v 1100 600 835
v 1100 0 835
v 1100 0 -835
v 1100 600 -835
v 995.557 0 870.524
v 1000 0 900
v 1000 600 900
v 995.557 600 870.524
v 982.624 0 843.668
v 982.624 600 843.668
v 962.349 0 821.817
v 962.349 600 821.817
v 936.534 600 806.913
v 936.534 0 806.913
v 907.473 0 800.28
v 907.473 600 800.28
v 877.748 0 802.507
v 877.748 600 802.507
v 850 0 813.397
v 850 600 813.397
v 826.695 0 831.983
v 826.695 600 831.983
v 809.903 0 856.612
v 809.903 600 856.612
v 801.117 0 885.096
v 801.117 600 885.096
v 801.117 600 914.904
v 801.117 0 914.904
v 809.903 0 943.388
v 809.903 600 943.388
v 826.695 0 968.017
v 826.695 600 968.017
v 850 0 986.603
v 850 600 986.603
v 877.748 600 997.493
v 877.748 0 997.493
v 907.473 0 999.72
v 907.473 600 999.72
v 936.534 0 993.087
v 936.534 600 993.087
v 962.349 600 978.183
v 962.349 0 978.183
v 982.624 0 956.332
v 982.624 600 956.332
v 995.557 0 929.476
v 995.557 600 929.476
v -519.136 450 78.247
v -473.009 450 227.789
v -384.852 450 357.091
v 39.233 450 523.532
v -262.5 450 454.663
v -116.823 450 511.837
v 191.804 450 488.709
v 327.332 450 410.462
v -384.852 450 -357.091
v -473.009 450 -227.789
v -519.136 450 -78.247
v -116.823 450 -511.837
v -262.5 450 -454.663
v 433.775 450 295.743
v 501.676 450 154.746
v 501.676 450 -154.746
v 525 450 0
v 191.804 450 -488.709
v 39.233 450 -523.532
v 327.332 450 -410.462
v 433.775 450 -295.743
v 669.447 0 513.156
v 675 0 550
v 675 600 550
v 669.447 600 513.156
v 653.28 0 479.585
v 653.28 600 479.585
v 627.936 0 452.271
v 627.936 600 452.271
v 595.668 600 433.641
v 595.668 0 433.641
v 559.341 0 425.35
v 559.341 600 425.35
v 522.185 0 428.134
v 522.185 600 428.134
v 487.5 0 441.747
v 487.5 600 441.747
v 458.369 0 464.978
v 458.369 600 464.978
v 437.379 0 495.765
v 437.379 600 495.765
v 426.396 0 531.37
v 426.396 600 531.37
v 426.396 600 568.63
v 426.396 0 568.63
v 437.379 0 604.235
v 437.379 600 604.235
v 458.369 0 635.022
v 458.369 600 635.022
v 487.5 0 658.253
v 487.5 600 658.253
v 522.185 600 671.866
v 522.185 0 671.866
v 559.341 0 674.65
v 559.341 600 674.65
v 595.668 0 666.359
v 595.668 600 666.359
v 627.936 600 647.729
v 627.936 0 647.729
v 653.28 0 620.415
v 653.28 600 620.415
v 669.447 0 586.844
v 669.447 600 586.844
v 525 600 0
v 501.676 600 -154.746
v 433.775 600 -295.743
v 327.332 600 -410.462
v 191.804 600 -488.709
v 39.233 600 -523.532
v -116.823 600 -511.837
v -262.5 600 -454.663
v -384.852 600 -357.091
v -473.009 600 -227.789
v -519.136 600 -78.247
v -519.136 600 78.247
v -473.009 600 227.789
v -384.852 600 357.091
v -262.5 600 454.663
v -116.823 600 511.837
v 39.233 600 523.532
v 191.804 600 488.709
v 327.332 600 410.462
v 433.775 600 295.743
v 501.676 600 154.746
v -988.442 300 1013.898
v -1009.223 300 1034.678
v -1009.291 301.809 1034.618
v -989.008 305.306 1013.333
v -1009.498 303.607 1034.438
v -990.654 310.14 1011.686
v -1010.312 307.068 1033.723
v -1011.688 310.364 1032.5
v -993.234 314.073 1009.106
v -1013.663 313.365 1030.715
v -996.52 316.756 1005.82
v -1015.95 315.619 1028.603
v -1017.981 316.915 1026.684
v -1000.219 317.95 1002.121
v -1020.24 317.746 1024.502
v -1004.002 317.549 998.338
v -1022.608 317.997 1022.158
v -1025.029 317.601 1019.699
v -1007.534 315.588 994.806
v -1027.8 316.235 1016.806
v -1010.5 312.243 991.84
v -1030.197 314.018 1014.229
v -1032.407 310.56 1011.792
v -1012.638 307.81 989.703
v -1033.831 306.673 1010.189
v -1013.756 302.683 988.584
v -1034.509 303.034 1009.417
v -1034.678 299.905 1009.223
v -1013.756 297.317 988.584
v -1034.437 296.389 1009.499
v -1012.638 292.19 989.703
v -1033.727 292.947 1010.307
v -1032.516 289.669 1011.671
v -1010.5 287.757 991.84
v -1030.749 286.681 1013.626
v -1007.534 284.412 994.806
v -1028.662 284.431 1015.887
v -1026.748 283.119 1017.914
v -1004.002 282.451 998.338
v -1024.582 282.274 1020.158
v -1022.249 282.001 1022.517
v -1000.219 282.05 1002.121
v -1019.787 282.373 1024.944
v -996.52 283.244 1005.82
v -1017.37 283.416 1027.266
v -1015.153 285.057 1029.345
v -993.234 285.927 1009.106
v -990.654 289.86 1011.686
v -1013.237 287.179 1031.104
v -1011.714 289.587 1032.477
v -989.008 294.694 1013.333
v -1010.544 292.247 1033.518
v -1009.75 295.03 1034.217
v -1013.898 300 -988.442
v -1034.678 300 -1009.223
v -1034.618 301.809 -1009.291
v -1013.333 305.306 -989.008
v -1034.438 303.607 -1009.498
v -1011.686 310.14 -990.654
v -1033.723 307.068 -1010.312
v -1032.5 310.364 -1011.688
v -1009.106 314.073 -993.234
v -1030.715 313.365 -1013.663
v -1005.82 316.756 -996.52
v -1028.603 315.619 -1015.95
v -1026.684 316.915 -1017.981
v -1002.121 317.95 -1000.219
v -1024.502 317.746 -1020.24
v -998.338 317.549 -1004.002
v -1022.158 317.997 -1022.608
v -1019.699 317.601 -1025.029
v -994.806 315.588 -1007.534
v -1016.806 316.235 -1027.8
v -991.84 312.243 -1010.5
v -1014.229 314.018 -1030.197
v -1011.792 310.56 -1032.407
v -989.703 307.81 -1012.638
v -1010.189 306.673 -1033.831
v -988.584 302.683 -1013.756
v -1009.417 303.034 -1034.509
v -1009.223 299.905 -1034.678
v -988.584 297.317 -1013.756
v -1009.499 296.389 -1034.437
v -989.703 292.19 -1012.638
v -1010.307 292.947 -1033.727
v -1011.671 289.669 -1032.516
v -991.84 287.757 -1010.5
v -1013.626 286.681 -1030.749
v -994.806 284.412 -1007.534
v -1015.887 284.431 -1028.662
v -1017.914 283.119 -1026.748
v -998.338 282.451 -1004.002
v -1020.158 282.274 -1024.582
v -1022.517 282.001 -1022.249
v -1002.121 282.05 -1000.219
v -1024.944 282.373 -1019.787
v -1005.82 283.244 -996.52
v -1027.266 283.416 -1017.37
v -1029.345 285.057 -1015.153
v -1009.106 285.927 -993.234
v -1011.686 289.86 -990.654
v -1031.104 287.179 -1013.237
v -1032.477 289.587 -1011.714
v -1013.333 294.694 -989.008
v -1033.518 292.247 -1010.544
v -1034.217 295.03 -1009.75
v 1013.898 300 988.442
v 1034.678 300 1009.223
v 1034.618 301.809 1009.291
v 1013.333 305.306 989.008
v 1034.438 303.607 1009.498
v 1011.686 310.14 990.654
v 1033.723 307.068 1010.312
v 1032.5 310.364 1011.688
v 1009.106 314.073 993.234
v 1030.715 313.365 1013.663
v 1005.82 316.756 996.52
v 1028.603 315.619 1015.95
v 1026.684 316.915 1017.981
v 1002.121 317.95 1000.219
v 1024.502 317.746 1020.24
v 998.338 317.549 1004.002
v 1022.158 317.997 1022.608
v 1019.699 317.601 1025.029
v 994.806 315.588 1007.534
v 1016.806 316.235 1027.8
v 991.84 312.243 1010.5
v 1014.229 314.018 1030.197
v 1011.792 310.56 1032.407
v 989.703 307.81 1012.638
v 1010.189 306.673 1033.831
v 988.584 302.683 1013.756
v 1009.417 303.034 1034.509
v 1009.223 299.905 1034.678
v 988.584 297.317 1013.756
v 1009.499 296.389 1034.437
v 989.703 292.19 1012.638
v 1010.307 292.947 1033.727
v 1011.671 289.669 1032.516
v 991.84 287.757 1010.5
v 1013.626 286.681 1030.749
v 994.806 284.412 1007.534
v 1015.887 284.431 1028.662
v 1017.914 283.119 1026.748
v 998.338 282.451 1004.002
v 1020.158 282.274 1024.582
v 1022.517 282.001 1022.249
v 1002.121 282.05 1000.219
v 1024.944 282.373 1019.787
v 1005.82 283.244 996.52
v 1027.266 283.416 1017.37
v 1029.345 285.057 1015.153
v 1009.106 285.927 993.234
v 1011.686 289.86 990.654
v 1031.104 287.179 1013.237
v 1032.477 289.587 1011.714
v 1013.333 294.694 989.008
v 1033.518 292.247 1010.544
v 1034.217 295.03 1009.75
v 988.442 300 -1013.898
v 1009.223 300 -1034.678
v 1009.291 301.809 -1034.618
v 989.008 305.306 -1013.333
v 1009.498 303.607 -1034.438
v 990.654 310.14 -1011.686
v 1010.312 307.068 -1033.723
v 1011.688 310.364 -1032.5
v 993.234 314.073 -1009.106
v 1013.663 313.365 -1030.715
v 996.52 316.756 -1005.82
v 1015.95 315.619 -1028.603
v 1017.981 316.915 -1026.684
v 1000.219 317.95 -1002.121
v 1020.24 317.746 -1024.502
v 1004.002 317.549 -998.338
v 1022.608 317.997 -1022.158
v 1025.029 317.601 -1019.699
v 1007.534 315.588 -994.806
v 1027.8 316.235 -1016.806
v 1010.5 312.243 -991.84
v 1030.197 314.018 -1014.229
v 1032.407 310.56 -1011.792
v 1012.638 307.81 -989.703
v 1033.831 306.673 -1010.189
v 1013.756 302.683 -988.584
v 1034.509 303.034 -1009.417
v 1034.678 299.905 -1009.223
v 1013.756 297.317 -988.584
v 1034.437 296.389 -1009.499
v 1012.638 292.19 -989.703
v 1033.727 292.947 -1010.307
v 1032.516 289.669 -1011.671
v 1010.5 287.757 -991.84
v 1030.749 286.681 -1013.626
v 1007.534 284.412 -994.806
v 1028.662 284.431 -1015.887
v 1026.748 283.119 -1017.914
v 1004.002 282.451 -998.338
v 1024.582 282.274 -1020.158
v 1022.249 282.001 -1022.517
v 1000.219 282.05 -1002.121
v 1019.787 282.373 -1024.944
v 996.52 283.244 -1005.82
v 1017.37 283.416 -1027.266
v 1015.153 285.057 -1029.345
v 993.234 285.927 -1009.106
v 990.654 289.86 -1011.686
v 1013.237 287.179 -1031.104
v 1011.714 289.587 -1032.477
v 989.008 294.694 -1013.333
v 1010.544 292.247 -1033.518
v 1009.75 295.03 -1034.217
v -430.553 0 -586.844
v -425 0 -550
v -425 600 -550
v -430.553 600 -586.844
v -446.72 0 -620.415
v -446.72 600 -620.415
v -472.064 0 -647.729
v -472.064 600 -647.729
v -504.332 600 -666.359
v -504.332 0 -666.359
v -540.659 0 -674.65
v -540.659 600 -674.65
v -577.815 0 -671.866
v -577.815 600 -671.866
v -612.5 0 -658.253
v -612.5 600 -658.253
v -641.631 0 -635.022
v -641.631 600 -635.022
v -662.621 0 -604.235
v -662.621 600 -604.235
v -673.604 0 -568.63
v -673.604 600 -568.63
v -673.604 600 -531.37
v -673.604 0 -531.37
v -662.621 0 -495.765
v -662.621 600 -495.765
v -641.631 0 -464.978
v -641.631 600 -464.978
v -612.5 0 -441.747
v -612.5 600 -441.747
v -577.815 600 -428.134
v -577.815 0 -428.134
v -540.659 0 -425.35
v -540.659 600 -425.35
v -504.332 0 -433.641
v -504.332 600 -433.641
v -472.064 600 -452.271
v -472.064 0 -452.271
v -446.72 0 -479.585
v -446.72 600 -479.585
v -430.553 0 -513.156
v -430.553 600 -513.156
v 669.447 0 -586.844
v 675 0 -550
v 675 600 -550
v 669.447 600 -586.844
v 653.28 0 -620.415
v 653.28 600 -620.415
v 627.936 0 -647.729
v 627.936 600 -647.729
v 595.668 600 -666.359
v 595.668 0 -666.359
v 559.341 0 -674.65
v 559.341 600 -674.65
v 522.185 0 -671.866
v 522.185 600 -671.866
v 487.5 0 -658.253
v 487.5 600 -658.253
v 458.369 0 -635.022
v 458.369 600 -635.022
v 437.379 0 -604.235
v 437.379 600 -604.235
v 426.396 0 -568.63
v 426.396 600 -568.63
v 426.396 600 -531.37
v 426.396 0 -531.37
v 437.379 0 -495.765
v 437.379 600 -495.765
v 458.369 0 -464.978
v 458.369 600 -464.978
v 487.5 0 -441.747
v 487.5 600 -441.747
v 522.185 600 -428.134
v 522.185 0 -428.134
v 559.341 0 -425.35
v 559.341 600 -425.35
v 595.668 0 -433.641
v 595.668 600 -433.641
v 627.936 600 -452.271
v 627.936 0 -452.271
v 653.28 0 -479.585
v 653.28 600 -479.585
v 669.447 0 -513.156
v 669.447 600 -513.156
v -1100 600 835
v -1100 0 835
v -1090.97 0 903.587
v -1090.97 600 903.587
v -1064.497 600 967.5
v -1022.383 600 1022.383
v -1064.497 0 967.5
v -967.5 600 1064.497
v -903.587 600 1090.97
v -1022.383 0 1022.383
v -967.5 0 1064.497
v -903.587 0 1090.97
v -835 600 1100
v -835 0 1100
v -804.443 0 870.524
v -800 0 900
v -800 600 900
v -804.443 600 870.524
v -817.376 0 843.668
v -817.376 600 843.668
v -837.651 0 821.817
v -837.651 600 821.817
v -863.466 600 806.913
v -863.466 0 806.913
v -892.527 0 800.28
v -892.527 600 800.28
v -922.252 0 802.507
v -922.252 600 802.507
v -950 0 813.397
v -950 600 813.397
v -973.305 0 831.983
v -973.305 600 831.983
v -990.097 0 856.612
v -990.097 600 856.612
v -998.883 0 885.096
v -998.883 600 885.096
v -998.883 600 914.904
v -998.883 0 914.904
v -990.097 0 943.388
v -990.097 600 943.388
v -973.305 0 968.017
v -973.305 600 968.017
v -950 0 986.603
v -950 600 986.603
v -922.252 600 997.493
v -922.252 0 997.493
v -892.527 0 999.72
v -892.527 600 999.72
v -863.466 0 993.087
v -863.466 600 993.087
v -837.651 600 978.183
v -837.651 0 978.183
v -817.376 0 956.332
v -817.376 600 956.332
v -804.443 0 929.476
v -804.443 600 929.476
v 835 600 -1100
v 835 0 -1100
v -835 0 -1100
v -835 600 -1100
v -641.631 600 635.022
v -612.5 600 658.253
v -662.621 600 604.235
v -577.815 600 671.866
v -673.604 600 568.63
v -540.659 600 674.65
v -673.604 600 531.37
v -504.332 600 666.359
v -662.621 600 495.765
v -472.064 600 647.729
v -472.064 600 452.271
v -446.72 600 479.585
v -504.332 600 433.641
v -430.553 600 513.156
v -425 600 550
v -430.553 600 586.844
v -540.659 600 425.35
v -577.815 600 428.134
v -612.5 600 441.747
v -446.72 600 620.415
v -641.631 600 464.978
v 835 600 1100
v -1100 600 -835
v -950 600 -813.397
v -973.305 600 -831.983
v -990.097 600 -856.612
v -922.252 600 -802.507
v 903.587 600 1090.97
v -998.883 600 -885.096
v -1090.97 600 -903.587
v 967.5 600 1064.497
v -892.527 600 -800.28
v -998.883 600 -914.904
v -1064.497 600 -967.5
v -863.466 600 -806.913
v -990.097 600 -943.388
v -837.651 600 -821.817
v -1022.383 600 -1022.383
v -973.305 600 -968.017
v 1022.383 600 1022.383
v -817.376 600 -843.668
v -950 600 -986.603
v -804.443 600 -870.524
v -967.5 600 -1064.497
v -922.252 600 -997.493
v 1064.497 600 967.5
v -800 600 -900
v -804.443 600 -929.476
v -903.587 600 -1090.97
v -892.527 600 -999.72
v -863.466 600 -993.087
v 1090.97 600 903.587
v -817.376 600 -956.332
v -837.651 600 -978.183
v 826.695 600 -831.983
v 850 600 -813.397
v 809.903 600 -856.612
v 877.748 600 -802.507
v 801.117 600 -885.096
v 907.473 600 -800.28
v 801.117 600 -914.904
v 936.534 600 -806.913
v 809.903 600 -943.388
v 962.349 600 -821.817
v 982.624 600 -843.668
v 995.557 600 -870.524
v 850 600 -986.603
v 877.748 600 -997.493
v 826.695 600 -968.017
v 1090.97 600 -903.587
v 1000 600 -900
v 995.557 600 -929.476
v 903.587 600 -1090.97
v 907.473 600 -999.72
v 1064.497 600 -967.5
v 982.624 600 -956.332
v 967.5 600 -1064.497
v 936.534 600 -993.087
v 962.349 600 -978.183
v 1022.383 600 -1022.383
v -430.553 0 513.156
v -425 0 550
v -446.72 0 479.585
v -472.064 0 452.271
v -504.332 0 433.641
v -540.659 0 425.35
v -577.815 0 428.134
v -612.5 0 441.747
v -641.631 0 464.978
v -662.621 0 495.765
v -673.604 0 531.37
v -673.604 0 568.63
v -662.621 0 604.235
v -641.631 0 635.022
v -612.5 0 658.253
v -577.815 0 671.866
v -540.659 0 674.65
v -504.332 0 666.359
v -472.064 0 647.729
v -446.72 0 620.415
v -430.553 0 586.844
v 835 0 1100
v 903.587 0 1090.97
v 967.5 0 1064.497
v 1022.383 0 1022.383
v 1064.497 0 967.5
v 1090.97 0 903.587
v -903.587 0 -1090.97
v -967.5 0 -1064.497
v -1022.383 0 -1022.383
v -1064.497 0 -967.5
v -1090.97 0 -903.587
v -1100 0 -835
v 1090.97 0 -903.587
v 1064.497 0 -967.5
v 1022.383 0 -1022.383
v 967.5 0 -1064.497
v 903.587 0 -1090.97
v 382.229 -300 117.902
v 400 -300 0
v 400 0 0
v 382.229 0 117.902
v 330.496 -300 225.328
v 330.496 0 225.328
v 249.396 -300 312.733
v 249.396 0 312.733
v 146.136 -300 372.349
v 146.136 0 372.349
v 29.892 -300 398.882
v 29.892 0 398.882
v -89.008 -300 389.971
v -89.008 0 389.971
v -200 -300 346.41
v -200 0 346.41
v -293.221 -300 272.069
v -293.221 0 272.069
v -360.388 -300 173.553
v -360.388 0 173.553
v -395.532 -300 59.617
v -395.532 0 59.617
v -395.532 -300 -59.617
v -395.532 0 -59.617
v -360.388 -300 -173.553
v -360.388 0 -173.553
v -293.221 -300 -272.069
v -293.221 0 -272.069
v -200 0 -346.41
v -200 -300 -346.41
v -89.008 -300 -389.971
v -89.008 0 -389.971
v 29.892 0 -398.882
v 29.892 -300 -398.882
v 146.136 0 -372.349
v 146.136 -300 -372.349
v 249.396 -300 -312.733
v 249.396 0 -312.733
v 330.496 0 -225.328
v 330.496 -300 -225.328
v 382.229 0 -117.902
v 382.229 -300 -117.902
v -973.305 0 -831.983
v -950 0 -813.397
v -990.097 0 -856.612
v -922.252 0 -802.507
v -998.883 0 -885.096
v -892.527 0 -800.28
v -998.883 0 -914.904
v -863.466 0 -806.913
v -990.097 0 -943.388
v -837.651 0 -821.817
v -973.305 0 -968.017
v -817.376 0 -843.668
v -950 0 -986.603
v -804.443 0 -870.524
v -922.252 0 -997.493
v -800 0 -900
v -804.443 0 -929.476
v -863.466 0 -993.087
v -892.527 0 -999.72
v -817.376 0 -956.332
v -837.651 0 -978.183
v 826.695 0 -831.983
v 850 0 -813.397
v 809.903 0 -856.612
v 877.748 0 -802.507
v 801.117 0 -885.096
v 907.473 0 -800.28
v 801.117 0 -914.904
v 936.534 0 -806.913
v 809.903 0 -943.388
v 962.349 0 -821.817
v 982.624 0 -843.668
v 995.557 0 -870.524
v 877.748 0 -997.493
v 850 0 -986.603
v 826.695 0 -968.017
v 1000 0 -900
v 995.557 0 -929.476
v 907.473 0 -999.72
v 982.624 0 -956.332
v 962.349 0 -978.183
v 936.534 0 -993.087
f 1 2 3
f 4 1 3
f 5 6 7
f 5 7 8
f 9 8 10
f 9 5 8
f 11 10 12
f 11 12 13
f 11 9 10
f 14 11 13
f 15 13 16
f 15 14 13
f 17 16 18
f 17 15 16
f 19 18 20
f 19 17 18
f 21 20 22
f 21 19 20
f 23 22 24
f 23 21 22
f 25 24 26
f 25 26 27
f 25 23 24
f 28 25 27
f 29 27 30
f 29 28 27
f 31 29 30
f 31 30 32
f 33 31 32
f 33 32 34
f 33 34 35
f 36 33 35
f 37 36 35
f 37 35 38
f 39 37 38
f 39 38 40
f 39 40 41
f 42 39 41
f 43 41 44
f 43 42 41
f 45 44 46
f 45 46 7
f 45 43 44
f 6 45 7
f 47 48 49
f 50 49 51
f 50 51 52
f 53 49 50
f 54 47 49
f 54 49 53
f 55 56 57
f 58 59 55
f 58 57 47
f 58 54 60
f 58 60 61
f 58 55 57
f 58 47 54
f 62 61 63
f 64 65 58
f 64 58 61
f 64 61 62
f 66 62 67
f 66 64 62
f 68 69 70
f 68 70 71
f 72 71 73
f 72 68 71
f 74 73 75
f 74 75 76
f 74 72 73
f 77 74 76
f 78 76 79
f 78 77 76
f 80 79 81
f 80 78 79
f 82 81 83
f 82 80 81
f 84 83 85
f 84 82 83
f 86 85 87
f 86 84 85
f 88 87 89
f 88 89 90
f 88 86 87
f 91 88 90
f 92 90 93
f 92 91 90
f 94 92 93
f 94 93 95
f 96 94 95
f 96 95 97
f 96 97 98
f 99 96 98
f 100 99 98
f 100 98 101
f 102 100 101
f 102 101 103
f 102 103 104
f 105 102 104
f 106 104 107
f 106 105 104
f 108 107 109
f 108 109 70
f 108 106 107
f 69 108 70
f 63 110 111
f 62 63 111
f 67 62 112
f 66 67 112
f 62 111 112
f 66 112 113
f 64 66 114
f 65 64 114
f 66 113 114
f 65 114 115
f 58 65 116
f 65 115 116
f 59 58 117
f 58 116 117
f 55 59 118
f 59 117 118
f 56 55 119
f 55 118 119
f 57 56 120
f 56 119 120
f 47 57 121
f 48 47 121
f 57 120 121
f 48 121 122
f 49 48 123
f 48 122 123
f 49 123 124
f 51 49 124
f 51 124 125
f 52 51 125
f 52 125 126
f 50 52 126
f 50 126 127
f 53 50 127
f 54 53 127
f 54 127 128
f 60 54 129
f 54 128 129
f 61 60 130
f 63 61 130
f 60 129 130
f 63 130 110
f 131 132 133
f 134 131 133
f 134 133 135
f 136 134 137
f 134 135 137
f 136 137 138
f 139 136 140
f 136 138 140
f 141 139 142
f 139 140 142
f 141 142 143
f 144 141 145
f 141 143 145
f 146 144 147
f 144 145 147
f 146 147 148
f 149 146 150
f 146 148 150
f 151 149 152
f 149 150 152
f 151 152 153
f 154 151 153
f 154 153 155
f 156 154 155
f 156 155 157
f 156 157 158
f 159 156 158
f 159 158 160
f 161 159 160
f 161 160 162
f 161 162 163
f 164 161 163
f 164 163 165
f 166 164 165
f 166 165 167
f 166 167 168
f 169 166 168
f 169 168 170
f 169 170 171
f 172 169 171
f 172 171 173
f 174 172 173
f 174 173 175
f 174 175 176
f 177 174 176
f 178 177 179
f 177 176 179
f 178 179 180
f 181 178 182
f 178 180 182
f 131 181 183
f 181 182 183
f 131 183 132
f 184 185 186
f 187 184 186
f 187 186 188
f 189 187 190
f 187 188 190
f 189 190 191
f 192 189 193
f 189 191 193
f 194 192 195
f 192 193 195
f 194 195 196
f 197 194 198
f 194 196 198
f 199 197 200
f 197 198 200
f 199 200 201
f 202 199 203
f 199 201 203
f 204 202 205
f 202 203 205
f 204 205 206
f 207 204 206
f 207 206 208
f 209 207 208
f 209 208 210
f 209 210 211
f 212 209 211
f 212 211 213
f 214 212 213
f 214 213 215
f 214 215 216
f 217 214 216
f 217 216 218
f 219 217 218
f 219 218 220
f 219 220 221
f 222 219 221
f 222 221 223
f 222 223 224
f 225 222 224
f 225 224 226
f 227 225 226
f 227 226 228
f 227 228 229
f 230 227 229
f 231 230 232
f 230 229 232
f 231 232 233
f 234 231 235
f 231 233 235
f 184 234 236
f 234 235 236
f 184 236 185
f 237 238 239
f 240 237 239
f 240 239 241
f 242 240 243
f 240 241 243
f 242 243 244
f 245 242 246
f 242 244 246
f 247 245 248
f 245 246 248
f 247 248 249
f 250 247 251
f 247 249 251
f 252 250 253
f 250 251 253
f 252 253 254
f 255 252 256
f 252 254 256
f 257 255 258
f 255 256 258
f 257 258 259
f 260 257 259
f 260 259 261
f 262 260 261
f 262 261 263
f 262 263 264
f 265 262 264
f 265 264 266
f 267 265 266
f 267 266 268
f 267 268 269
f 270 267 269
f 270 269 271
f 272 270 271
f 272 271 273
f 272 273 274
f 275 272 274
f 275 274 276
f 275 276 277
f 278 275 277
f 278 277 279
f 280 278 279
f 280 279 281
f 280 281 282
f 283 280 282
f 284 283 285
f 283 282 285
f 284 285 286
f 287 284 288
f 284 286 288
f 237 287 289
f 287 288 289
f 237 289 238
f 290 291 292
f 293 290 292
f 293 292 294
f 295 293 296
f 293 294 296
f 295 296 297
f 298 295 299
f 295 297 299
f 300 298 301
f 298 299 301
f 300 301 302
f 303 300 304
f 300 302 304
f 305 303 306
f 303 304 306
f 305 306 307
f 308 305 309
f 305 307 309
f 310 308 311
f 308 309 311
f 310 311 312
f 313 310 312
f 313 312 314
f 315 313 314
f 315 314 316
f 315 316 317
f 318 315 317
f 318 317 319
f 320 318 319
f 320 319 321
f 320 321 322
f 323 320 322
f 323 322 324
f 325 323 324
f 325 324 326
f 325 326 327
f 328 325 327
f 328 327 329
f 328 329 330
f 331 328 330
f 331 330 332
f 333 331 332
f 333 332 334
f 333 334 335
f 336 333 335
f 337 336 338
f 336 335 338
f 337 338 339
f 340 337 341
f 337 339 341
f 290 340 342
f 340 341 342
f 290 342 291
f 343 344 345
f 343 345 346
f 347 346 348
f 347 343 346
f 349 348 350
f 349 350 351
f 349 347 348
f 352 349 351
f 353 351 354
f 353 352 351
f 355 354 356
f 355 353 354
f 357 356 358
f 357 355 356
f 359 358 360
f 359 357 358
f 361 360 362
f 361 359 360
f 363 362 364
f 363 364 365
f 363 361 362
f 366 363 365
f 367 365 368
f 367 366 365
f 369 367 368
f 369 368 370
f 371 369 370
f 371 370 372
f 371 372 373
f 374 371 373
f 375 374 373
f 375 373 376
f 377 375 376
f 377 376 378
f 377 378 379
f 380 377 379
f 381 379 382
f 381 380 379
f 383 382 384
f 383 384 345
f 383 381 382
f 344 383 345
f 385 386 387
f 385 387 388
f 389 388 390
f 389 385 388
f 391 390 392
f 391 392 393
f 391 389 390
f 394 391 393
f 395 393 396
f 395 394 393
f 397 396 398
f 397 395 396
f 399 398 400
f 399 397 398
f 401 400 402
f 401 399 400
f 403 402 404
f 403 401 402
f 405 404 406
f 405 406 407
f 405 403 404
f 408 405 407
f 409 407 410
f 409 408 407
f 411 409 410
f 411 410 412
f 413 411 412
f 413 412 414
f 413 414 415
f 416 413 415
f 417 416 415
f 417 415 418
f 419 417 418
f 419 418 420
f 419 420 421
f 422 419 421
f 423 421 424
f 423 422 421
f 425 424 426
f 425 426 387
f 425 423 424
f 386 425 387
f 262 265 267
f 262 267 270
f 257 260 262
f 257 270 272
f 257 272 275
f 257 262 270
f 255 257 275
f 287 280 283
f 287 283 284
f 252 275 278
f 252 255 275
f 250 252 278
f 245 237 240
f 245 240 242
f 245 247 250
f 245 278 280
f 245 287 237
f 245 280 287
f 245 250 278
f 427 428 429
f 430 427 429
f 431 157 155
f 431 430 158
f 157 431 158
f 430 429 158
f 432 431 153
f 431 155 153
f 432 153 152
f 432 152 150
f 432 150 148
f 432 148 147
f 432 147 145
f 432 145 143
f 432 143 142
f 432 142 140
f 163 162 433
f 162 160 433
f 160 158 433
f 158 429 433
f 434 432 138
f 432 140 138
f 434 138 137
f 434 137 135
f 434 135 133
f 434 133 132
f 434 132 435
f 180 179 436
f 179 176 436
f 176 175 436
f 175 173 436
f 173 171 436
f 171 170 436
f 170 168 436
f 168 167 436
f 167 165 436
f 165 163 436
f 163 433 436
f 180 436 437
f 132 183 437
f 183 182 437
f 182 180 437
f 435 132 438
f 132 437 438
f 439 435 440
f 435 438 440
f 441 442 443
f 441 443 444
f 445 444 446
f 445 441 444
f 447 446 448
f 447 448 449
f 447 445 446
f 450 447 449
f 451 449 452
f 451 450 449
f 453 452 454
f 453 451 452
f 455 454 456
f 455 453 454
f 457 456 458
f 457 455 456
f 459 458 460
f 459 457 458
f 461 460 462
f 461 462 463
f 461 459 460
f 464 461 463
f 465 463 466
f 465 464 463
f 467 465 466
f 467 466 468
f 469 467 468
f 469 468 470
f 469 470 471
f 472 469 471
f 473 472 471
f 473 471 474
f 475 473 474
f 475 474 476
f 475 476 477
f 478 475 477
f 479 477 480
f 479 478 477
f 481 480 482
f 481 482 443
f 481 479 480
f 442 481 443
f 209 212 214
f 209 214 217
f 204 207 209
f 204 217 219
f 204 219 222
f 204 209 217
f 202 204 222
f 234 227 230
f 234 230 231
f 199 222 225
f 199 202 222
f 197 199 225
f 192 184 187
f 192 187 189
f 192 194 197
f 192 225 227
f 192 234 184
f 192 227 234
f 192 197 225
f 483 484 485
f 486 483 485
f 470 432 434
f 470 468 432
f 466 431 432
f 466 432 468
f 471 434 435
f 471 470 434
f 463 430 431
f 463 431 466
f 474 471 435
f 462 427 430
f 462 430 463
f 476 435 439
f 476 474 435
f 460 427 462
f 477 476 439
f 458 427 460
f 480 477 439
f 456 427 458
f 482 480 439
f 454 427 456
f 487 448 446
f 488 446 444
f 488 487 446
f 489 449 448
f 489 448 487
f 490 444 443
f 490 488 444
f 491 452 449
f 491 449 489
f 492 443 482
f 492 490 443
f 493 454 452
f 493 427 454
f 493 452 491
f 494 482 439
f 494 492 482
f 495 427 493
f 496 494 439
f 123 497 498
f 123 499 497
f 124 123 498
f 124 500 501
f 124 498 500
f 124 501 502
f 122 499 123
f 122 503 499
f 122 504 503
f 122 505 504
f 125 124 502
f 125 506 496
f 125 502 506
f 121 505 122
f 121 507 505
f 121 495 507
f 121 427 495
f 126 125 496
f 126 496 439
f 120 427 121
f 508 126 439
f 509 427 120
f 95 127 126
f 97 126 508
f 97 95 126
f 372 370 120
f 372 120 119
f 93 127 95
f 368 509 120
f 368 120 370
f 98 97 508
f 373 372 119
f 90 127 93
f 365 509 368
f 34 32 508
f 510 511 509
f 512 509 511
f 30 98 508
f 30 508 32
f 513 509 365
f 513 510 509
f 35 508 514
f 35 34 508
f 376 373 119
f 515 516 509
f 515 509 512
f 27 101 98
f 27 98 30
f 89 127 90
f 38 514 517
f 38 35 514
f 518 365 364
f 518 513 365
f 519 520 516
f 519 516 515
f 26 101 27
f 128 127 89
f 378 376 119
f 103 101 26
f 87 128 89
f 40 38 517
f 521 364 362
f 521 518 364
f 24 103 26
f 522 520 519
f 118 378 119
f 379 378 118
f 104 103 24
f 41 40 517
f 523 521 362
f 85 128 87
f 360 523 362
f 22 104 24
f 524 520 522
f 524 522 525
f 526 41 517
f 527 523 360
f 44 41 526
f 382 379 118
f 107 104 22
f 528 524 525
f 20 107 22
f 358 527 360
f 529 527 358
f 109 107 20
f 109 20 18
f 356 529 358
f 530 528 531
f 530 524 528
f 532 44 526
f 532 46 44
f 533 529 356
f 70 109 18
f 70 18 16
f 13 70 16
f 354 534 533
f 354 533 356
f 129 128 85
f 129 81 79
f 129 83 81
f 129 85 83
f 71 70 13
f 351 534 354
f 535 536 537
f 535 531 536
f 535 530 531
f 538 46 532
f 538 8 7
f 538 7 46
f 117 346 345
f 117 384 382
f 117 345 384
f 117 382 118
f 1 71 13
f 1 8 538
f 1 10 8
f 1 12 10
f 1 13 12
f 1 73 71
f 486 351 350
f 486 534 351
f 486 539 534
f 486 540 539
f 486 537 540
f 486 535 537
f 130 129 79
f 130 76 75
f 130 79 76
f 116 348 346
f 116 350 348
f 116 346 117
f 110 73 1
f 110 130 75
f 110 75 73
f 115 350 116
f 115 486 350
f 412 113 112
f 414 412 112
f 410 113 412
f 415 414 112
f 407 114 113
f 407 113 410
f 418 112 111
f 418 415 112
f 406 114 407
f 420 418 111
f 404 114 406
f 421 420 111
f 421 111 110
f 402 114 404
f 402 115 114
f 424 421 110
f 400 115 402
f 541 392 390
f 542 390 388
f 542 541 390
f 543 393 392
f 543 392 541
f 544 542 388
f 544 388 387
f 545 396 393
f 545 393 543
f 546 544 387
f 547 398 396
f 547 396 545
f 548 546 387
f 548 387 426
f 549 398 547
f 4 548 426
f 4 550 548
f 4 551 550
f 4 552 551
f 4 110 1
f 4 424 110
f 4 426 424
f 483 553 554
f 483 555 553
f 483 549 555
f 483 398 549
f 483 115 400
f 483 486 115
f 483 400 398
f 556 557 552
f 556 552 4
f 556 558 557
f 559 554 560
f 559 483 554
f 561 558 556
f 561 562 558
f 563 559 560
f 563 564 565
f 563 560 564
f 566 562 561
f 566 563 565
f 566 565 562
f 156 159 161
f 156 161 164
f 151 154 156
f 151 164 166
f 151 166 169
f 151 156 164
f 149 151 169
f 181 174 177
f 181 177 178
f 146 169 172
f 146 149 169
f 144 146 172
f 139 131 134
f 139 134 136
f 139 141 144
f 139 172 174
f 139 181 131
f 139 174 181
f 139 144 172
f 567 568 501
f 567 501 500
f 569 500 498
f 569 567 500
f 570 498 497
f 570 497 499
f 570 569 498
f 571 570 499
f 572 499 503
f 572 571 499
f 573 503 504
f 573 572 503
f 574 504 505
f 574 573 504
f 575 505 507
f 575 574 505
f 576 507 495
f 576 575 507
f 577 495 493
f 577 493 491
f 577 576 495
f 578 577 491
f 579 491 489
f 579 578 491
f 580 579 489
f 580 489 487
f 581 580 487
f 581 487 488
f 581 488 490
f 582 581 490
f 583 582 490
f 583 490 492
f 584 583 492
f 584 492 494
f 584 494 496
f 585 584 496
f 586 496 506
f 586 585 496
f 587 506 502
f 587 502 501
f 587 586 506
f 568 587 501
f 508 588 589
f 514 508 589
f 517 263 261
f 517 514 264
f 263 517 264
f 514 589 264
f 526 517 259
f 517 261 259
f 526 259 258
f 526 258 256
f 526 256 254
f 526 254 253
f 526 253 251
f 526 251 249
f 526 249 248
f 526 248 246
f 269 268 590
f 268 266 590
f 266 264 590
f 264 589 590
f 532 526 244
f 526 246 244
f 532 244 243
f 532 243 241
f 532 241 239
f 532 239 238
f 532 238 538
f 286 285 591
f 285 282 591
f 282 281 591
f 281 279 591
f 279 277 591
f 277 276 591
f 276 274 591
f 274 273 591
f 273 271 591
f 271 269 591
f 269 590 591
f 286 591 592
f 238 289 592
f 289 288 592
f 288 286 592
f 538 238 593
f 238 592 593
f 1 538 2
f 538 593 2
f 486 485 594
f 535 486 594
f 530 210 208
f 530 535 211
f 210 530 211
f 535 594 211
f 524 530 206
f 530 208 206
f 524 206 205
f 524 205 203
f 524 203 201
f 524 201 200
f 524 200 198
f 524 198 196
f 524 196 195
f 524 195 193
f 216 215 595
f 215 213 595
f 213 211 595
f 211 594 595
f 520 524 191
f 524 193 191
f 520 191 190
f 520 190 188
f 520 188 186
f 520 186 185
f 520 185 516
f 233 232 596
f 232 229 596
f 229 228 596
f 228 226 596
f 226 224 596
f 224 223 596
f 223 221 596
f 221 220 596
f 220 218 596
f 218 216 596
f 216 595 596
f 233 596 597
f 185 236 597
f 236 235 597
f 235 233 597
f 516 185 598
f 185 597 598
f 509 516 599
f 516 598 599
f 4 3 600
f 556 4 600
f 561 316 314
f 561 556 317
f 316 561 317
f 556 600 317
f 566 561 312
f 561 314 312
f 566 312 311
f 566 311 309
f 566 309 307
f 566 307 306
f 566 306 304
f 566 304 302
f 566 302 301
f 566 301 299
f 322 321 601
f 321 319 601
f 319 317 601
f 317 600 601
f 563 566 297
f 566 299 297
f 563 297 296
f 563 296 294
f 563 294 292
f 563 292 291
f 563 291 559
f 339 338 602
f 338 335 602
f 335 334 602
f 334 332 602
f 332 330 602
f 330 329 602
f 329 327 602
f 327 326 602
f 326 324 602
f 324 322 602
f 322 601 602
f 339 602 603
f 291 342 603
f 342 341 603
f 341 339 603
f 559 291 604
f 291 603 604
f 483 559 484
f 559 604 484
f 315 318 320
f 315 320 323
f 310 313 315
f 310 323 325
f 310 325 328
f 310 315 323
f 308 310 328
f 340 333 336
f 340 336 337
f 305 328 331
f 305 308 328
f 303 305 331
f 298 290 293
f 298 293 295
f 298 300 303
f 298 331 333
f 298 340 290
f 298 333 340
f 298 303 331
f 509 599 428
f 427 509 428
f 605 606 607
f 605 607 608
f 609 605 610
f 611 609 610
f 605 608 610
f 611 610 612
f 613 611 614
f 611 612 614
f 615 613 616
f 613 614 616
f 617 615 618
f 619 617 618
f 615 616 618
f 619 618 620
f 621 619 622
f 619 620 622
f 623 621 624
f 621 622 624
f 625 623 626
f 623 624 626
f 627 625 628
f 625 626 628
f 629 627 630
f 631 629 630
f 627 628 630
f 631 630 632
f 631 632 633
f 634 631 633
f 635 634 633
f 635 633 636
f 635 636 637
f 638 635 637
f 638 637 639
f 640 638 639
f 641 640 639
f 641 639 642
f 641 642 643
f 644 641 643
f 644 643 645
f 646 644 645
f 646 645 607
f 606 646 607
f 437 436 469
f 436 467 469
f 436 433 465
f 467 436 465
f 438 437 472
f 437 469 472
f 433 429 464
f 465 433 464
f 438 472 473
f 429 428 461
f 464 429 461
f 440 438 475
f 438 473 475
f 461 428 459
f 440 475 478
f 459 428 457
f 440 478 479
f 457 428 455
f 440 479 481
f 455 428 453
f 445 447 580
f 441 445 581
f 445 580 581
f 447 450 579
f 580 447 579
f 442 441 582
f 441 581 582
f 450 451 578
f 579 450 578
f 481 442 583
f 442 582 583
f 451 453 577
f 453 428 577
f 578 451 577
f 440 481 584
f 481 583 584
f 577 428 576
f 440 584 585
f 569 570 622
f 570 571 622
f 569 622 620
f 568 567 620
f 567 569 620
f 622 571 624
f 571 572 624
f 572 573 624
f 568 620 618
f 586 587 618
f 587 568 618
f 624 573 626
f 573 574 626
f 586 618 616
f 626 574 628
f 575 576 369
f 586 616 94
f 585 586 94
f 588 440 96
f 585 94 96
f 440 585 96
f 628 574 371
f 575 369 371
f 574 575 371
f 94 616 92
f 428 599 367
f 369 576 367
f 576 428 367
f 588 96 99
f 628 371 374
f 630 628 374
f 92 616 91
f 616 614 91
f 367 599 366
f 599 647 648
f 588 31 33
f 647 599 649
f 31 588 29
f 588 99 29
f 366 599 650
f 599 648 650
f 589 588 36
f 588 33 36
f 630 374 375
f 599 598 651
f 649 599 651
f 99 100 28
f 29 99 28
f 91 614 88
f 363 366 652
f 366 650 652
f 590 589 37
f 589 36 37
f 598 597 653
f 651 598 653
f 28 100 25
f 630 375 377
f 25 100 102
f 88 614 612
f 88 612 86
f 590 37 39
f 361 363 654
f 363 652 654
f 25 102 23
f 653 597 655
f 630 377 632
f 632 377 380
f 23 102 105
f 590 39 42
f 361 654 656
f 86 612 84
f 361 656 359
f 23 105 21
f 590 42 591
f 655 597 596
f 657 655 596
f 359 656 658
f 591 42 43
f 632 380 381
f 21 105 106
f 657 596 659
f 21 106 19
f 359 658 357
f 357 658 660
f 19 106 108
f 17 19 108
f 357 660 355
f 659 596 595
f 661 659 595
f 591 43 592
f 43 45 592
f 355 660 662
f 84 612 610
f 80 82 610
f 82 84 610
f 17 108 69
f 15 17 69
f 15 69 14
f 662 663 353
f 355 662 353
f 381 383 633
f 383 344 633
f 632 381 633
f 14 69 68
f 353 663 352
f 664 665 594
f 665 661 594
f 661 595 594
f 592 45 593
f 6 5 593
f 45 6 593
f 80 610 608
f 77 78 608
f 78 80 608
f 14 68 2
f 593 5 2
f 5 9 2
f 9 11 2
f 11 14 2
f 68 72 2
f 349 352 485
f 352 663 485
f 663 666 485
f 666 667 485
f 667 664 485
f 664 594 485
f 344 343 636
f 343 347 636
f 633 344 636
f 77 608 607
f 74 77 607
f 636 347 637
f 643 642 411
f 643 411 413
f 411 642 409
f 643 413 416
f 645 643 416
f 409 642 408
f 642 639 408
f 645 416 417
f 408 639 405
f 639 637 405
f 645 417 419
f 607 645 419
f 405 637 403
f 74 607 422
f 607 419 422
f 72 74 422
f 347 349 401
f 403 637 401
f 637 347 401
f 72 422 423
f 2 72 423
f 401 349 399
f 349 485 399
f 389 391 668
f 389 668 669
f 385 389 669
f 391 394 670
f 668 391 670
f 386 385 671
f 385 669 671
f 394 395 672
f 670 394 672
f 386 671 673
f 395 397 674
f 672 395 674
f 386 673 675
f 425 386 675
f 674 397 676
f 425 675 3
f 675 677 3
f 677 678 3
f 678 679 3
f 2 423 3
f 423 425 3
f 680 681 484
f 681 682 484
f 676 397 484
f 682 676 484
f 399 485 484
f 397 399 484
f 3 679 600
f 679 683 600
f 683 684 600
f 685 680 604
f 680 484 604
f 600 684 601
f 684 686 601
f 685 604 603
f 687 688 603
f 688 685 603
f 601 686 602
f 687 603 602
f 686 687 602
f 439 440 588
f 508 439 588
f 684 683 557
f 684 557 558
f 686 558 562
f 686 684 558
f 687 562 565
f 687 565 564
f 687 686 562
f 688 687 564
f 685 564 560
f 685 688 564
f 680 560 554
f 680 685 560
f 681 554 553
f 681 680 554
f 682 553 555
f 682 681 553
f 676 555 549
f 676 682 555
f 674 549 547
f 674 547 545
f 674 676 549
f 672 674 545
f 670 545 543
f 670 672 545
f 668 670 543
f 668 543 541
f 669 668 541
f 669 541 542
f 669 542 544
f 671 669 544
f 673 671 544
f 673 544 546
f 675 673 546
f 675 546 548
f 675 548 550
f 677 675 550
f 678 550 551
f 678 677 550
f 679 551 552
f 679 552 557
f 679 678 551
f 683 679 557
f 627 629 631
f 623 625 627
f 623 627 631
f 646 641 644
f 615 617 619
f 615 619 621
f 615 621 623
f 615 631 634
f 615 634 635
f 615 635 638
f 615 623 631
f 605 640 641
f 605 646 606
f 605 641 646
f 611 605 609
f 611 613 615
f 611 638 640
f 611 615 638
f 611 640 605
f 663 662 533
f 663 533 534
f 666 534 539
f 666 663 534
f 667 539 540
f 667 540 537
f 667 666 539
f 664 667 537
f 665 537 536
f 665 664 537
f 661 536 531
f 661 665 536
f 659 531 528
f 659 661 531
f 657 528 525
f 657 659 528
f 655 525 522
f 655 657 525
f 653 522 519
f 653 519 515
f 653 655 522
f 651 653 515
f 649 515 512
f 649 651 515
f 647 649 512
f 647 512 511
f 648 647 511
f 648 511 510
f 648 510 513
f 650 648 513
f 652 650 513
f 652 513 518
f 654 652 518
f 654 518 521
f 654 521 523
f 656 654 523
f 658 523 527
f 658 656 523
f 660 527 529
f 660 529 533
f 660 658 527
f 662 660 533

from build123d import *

# Parameters (mm, degrees)
IZIM1_R                     = 100
IZIM1_R_2                   = 125
Y_KSEKLIK_EKSTR_ZYON3_DEPTH = 600
IZIM2_R                     = 525
KES_EKSTR_ZYON1_DEPTH       = 150
IZIM3_R                     = 400
KES_EKSTR_ZYON2_DEPTH       = 200
IZIM4_R                     = 400
Y_KSEKLIK_EKSTR_ZYON4_DEPTH = 500
IZIM6_R                     = 18
KES_EKSTR_ZYON3_DEPTH       = 30
IZIM8_R                     = 18
KES_EKSTR_ZYON4_DEPTH       = 30
IZIM9_R                     = 18
KES_EKSTR_ZYON5_DEPTH       = 30
IZIM10_R                    = 18
KES_EKSTR_ZYON6_DEPTH       = 30


with BuildPart() as part:
    # Çizim1 → Yükseklik-Ekstrüzyon3 (new body)
    with BuildSketch(Plane(origin=(0, 0, 0), x_dir=(1, 0, 0), z_dir=(0, 1, 0))):
        with BuildLine():
            Line((-835, -1100), (835, -1100))
            ThreePointArc((835, -1100), (1022.383297014, -1022.383297014), (1100, -835))
            Line((1100, -835), (1100, 835))
            ThreePointArc((1100, 835), (1022.383297014, 1022.383297014), (835, 1100))
            Line((835, 1100), (-835, 1100))
            ThreePointArc((-835, 1100), (-1022.383297014, 1022.383297014), (-1100, 835))
            Line((-1100, 835), (-1100, -835))
            ThreePointArc((-1100, -835), (-1022.383297014, -1022.383297014), (-835, -1100))
        make_face()
        with Locations((-900, -900)):
            Circle(IZIM1_R, mode=Mode.SUBTRACT)
        with Locations((-900, 900)):
            Circle(IZIM1_R, mode=Mode.SUBTRACT)
        with Locations((900, 900)):
            Circle(IZIM1_R, mode=Mode.SUBTRACT)
        with Locations((900, -900)):
            Circle(IZIM1_R, mode=Mode.SUBTRACT)
        with Locations((-550, 550)):
            Circle(IZIM1_R_2, mode=Mode.SUBTRACT)
        with Locations((550, 550)):
            Circle(IZIM1_R_2, mode=Mode.SUBTRACT)
        with Locations((550, -550)):
            Circle(IZIM1_R_2, mode=Mode.SUBTRACT)
        with Locations((-550, -550)):
            Circle(IZIM1_R_2, mode=Mode.SUBTRACT)
    extrude(amount=Y_KSEKLIK_EKSTR_ZYON3_DEPTH)

    # Çizim2 → Kes-Ekstrüzyon1 (cut)
    with BuildSketch(Plane(origin=(0, 600, 0), x_dir=(1, 0, 0), z_dir=(0, 1, 0))):
        Circle(IZIM2_R)
    extrude(amount=-KES_EKSTR_ZYON1_DEPTH, mode=Mode.SUBTRACT)

    # Çizim3 → Kes-Ekstrüzyon2 (cut)
    with BuildSketch(Plane.XZ):
        Circle(IZIM3_R)
    extrude(amount=-KES_EKSTR_ZYON2_DEPTH, mode=Mode.SUBTRACT)

    # Çizim4 → Yükseklik-Ekstrüzyon4 (add)
    with BuildSketch(Plane.XZ.offset(-200)):
        Circle(IZIM4_R)
    extrude(amount=Y_KSEKLIK_EKSTR_ZYON4_DEPTH)

    # Çizim6 → Kes-Ekstrüzyon3 (cut)
    with BuildSketch(Plane(origin=(1022.383297014, 600, 1022.383297014), x_dir=(0.707106781, 0, -0.707106781), z_dir=(0.707106781, 0, 0.707106781))):
        with Locations((0, -300)):
            Circle(IZIM6_R)
    extrude(amount=-KES_EKSTR_ZYON3_DEPTH, mode=Mode.SUBTRACT)

    # Çizim8 → Kes-Ekstrüzyon4 (cut)
    with BuildSketch(Plane(origin=(1022.383297014, 600, -1022.383297014), x_dir=(-0.707106781, 0, -0.707106781), z_dir=(0.707106781, 0, -0.707106781))):
        with Locations((0, -300)):
            Circle(IZIM8_R)
    extrude(amount=-KES_EKSTR_ZYON4_DEPTH, mode=Mode.SUBTRACT)

    # Çizim9 → Kes-Ekstrüzyon5 (cut)
    with BuildSketch(Plane(origin=(-1022.383297014, 600, -1022.383297014), x_dir=(-0.707106781, 0, 0.707106781), z_dir=(-0.707106781, 0, -0.707106781))):
        with Locations((0, -300)):
            Circle(IZIM9_R)
    extrude(amount=-KES_EKSTR_ZYON5_DEPTH, mode=Mode.SUBTRACT)

    # Çizim10 → Kes-Ekstrüzyon6 (cut)
    with BuildSketch(Plane(origin=(-1022.383297014, 600, 1022.383297014), x_dir=(0.707106781, 0, 0.707106781), z_dir=(-0.707106781, 0, 0.707106781))):
        with Locations((0, -300)):
            Circle(IZIM10_R)
    extrude(amount=-KES_EKSTR_ZYON6_DEPTH, mode=Mode.SUBTRACT)


solid = part.part
